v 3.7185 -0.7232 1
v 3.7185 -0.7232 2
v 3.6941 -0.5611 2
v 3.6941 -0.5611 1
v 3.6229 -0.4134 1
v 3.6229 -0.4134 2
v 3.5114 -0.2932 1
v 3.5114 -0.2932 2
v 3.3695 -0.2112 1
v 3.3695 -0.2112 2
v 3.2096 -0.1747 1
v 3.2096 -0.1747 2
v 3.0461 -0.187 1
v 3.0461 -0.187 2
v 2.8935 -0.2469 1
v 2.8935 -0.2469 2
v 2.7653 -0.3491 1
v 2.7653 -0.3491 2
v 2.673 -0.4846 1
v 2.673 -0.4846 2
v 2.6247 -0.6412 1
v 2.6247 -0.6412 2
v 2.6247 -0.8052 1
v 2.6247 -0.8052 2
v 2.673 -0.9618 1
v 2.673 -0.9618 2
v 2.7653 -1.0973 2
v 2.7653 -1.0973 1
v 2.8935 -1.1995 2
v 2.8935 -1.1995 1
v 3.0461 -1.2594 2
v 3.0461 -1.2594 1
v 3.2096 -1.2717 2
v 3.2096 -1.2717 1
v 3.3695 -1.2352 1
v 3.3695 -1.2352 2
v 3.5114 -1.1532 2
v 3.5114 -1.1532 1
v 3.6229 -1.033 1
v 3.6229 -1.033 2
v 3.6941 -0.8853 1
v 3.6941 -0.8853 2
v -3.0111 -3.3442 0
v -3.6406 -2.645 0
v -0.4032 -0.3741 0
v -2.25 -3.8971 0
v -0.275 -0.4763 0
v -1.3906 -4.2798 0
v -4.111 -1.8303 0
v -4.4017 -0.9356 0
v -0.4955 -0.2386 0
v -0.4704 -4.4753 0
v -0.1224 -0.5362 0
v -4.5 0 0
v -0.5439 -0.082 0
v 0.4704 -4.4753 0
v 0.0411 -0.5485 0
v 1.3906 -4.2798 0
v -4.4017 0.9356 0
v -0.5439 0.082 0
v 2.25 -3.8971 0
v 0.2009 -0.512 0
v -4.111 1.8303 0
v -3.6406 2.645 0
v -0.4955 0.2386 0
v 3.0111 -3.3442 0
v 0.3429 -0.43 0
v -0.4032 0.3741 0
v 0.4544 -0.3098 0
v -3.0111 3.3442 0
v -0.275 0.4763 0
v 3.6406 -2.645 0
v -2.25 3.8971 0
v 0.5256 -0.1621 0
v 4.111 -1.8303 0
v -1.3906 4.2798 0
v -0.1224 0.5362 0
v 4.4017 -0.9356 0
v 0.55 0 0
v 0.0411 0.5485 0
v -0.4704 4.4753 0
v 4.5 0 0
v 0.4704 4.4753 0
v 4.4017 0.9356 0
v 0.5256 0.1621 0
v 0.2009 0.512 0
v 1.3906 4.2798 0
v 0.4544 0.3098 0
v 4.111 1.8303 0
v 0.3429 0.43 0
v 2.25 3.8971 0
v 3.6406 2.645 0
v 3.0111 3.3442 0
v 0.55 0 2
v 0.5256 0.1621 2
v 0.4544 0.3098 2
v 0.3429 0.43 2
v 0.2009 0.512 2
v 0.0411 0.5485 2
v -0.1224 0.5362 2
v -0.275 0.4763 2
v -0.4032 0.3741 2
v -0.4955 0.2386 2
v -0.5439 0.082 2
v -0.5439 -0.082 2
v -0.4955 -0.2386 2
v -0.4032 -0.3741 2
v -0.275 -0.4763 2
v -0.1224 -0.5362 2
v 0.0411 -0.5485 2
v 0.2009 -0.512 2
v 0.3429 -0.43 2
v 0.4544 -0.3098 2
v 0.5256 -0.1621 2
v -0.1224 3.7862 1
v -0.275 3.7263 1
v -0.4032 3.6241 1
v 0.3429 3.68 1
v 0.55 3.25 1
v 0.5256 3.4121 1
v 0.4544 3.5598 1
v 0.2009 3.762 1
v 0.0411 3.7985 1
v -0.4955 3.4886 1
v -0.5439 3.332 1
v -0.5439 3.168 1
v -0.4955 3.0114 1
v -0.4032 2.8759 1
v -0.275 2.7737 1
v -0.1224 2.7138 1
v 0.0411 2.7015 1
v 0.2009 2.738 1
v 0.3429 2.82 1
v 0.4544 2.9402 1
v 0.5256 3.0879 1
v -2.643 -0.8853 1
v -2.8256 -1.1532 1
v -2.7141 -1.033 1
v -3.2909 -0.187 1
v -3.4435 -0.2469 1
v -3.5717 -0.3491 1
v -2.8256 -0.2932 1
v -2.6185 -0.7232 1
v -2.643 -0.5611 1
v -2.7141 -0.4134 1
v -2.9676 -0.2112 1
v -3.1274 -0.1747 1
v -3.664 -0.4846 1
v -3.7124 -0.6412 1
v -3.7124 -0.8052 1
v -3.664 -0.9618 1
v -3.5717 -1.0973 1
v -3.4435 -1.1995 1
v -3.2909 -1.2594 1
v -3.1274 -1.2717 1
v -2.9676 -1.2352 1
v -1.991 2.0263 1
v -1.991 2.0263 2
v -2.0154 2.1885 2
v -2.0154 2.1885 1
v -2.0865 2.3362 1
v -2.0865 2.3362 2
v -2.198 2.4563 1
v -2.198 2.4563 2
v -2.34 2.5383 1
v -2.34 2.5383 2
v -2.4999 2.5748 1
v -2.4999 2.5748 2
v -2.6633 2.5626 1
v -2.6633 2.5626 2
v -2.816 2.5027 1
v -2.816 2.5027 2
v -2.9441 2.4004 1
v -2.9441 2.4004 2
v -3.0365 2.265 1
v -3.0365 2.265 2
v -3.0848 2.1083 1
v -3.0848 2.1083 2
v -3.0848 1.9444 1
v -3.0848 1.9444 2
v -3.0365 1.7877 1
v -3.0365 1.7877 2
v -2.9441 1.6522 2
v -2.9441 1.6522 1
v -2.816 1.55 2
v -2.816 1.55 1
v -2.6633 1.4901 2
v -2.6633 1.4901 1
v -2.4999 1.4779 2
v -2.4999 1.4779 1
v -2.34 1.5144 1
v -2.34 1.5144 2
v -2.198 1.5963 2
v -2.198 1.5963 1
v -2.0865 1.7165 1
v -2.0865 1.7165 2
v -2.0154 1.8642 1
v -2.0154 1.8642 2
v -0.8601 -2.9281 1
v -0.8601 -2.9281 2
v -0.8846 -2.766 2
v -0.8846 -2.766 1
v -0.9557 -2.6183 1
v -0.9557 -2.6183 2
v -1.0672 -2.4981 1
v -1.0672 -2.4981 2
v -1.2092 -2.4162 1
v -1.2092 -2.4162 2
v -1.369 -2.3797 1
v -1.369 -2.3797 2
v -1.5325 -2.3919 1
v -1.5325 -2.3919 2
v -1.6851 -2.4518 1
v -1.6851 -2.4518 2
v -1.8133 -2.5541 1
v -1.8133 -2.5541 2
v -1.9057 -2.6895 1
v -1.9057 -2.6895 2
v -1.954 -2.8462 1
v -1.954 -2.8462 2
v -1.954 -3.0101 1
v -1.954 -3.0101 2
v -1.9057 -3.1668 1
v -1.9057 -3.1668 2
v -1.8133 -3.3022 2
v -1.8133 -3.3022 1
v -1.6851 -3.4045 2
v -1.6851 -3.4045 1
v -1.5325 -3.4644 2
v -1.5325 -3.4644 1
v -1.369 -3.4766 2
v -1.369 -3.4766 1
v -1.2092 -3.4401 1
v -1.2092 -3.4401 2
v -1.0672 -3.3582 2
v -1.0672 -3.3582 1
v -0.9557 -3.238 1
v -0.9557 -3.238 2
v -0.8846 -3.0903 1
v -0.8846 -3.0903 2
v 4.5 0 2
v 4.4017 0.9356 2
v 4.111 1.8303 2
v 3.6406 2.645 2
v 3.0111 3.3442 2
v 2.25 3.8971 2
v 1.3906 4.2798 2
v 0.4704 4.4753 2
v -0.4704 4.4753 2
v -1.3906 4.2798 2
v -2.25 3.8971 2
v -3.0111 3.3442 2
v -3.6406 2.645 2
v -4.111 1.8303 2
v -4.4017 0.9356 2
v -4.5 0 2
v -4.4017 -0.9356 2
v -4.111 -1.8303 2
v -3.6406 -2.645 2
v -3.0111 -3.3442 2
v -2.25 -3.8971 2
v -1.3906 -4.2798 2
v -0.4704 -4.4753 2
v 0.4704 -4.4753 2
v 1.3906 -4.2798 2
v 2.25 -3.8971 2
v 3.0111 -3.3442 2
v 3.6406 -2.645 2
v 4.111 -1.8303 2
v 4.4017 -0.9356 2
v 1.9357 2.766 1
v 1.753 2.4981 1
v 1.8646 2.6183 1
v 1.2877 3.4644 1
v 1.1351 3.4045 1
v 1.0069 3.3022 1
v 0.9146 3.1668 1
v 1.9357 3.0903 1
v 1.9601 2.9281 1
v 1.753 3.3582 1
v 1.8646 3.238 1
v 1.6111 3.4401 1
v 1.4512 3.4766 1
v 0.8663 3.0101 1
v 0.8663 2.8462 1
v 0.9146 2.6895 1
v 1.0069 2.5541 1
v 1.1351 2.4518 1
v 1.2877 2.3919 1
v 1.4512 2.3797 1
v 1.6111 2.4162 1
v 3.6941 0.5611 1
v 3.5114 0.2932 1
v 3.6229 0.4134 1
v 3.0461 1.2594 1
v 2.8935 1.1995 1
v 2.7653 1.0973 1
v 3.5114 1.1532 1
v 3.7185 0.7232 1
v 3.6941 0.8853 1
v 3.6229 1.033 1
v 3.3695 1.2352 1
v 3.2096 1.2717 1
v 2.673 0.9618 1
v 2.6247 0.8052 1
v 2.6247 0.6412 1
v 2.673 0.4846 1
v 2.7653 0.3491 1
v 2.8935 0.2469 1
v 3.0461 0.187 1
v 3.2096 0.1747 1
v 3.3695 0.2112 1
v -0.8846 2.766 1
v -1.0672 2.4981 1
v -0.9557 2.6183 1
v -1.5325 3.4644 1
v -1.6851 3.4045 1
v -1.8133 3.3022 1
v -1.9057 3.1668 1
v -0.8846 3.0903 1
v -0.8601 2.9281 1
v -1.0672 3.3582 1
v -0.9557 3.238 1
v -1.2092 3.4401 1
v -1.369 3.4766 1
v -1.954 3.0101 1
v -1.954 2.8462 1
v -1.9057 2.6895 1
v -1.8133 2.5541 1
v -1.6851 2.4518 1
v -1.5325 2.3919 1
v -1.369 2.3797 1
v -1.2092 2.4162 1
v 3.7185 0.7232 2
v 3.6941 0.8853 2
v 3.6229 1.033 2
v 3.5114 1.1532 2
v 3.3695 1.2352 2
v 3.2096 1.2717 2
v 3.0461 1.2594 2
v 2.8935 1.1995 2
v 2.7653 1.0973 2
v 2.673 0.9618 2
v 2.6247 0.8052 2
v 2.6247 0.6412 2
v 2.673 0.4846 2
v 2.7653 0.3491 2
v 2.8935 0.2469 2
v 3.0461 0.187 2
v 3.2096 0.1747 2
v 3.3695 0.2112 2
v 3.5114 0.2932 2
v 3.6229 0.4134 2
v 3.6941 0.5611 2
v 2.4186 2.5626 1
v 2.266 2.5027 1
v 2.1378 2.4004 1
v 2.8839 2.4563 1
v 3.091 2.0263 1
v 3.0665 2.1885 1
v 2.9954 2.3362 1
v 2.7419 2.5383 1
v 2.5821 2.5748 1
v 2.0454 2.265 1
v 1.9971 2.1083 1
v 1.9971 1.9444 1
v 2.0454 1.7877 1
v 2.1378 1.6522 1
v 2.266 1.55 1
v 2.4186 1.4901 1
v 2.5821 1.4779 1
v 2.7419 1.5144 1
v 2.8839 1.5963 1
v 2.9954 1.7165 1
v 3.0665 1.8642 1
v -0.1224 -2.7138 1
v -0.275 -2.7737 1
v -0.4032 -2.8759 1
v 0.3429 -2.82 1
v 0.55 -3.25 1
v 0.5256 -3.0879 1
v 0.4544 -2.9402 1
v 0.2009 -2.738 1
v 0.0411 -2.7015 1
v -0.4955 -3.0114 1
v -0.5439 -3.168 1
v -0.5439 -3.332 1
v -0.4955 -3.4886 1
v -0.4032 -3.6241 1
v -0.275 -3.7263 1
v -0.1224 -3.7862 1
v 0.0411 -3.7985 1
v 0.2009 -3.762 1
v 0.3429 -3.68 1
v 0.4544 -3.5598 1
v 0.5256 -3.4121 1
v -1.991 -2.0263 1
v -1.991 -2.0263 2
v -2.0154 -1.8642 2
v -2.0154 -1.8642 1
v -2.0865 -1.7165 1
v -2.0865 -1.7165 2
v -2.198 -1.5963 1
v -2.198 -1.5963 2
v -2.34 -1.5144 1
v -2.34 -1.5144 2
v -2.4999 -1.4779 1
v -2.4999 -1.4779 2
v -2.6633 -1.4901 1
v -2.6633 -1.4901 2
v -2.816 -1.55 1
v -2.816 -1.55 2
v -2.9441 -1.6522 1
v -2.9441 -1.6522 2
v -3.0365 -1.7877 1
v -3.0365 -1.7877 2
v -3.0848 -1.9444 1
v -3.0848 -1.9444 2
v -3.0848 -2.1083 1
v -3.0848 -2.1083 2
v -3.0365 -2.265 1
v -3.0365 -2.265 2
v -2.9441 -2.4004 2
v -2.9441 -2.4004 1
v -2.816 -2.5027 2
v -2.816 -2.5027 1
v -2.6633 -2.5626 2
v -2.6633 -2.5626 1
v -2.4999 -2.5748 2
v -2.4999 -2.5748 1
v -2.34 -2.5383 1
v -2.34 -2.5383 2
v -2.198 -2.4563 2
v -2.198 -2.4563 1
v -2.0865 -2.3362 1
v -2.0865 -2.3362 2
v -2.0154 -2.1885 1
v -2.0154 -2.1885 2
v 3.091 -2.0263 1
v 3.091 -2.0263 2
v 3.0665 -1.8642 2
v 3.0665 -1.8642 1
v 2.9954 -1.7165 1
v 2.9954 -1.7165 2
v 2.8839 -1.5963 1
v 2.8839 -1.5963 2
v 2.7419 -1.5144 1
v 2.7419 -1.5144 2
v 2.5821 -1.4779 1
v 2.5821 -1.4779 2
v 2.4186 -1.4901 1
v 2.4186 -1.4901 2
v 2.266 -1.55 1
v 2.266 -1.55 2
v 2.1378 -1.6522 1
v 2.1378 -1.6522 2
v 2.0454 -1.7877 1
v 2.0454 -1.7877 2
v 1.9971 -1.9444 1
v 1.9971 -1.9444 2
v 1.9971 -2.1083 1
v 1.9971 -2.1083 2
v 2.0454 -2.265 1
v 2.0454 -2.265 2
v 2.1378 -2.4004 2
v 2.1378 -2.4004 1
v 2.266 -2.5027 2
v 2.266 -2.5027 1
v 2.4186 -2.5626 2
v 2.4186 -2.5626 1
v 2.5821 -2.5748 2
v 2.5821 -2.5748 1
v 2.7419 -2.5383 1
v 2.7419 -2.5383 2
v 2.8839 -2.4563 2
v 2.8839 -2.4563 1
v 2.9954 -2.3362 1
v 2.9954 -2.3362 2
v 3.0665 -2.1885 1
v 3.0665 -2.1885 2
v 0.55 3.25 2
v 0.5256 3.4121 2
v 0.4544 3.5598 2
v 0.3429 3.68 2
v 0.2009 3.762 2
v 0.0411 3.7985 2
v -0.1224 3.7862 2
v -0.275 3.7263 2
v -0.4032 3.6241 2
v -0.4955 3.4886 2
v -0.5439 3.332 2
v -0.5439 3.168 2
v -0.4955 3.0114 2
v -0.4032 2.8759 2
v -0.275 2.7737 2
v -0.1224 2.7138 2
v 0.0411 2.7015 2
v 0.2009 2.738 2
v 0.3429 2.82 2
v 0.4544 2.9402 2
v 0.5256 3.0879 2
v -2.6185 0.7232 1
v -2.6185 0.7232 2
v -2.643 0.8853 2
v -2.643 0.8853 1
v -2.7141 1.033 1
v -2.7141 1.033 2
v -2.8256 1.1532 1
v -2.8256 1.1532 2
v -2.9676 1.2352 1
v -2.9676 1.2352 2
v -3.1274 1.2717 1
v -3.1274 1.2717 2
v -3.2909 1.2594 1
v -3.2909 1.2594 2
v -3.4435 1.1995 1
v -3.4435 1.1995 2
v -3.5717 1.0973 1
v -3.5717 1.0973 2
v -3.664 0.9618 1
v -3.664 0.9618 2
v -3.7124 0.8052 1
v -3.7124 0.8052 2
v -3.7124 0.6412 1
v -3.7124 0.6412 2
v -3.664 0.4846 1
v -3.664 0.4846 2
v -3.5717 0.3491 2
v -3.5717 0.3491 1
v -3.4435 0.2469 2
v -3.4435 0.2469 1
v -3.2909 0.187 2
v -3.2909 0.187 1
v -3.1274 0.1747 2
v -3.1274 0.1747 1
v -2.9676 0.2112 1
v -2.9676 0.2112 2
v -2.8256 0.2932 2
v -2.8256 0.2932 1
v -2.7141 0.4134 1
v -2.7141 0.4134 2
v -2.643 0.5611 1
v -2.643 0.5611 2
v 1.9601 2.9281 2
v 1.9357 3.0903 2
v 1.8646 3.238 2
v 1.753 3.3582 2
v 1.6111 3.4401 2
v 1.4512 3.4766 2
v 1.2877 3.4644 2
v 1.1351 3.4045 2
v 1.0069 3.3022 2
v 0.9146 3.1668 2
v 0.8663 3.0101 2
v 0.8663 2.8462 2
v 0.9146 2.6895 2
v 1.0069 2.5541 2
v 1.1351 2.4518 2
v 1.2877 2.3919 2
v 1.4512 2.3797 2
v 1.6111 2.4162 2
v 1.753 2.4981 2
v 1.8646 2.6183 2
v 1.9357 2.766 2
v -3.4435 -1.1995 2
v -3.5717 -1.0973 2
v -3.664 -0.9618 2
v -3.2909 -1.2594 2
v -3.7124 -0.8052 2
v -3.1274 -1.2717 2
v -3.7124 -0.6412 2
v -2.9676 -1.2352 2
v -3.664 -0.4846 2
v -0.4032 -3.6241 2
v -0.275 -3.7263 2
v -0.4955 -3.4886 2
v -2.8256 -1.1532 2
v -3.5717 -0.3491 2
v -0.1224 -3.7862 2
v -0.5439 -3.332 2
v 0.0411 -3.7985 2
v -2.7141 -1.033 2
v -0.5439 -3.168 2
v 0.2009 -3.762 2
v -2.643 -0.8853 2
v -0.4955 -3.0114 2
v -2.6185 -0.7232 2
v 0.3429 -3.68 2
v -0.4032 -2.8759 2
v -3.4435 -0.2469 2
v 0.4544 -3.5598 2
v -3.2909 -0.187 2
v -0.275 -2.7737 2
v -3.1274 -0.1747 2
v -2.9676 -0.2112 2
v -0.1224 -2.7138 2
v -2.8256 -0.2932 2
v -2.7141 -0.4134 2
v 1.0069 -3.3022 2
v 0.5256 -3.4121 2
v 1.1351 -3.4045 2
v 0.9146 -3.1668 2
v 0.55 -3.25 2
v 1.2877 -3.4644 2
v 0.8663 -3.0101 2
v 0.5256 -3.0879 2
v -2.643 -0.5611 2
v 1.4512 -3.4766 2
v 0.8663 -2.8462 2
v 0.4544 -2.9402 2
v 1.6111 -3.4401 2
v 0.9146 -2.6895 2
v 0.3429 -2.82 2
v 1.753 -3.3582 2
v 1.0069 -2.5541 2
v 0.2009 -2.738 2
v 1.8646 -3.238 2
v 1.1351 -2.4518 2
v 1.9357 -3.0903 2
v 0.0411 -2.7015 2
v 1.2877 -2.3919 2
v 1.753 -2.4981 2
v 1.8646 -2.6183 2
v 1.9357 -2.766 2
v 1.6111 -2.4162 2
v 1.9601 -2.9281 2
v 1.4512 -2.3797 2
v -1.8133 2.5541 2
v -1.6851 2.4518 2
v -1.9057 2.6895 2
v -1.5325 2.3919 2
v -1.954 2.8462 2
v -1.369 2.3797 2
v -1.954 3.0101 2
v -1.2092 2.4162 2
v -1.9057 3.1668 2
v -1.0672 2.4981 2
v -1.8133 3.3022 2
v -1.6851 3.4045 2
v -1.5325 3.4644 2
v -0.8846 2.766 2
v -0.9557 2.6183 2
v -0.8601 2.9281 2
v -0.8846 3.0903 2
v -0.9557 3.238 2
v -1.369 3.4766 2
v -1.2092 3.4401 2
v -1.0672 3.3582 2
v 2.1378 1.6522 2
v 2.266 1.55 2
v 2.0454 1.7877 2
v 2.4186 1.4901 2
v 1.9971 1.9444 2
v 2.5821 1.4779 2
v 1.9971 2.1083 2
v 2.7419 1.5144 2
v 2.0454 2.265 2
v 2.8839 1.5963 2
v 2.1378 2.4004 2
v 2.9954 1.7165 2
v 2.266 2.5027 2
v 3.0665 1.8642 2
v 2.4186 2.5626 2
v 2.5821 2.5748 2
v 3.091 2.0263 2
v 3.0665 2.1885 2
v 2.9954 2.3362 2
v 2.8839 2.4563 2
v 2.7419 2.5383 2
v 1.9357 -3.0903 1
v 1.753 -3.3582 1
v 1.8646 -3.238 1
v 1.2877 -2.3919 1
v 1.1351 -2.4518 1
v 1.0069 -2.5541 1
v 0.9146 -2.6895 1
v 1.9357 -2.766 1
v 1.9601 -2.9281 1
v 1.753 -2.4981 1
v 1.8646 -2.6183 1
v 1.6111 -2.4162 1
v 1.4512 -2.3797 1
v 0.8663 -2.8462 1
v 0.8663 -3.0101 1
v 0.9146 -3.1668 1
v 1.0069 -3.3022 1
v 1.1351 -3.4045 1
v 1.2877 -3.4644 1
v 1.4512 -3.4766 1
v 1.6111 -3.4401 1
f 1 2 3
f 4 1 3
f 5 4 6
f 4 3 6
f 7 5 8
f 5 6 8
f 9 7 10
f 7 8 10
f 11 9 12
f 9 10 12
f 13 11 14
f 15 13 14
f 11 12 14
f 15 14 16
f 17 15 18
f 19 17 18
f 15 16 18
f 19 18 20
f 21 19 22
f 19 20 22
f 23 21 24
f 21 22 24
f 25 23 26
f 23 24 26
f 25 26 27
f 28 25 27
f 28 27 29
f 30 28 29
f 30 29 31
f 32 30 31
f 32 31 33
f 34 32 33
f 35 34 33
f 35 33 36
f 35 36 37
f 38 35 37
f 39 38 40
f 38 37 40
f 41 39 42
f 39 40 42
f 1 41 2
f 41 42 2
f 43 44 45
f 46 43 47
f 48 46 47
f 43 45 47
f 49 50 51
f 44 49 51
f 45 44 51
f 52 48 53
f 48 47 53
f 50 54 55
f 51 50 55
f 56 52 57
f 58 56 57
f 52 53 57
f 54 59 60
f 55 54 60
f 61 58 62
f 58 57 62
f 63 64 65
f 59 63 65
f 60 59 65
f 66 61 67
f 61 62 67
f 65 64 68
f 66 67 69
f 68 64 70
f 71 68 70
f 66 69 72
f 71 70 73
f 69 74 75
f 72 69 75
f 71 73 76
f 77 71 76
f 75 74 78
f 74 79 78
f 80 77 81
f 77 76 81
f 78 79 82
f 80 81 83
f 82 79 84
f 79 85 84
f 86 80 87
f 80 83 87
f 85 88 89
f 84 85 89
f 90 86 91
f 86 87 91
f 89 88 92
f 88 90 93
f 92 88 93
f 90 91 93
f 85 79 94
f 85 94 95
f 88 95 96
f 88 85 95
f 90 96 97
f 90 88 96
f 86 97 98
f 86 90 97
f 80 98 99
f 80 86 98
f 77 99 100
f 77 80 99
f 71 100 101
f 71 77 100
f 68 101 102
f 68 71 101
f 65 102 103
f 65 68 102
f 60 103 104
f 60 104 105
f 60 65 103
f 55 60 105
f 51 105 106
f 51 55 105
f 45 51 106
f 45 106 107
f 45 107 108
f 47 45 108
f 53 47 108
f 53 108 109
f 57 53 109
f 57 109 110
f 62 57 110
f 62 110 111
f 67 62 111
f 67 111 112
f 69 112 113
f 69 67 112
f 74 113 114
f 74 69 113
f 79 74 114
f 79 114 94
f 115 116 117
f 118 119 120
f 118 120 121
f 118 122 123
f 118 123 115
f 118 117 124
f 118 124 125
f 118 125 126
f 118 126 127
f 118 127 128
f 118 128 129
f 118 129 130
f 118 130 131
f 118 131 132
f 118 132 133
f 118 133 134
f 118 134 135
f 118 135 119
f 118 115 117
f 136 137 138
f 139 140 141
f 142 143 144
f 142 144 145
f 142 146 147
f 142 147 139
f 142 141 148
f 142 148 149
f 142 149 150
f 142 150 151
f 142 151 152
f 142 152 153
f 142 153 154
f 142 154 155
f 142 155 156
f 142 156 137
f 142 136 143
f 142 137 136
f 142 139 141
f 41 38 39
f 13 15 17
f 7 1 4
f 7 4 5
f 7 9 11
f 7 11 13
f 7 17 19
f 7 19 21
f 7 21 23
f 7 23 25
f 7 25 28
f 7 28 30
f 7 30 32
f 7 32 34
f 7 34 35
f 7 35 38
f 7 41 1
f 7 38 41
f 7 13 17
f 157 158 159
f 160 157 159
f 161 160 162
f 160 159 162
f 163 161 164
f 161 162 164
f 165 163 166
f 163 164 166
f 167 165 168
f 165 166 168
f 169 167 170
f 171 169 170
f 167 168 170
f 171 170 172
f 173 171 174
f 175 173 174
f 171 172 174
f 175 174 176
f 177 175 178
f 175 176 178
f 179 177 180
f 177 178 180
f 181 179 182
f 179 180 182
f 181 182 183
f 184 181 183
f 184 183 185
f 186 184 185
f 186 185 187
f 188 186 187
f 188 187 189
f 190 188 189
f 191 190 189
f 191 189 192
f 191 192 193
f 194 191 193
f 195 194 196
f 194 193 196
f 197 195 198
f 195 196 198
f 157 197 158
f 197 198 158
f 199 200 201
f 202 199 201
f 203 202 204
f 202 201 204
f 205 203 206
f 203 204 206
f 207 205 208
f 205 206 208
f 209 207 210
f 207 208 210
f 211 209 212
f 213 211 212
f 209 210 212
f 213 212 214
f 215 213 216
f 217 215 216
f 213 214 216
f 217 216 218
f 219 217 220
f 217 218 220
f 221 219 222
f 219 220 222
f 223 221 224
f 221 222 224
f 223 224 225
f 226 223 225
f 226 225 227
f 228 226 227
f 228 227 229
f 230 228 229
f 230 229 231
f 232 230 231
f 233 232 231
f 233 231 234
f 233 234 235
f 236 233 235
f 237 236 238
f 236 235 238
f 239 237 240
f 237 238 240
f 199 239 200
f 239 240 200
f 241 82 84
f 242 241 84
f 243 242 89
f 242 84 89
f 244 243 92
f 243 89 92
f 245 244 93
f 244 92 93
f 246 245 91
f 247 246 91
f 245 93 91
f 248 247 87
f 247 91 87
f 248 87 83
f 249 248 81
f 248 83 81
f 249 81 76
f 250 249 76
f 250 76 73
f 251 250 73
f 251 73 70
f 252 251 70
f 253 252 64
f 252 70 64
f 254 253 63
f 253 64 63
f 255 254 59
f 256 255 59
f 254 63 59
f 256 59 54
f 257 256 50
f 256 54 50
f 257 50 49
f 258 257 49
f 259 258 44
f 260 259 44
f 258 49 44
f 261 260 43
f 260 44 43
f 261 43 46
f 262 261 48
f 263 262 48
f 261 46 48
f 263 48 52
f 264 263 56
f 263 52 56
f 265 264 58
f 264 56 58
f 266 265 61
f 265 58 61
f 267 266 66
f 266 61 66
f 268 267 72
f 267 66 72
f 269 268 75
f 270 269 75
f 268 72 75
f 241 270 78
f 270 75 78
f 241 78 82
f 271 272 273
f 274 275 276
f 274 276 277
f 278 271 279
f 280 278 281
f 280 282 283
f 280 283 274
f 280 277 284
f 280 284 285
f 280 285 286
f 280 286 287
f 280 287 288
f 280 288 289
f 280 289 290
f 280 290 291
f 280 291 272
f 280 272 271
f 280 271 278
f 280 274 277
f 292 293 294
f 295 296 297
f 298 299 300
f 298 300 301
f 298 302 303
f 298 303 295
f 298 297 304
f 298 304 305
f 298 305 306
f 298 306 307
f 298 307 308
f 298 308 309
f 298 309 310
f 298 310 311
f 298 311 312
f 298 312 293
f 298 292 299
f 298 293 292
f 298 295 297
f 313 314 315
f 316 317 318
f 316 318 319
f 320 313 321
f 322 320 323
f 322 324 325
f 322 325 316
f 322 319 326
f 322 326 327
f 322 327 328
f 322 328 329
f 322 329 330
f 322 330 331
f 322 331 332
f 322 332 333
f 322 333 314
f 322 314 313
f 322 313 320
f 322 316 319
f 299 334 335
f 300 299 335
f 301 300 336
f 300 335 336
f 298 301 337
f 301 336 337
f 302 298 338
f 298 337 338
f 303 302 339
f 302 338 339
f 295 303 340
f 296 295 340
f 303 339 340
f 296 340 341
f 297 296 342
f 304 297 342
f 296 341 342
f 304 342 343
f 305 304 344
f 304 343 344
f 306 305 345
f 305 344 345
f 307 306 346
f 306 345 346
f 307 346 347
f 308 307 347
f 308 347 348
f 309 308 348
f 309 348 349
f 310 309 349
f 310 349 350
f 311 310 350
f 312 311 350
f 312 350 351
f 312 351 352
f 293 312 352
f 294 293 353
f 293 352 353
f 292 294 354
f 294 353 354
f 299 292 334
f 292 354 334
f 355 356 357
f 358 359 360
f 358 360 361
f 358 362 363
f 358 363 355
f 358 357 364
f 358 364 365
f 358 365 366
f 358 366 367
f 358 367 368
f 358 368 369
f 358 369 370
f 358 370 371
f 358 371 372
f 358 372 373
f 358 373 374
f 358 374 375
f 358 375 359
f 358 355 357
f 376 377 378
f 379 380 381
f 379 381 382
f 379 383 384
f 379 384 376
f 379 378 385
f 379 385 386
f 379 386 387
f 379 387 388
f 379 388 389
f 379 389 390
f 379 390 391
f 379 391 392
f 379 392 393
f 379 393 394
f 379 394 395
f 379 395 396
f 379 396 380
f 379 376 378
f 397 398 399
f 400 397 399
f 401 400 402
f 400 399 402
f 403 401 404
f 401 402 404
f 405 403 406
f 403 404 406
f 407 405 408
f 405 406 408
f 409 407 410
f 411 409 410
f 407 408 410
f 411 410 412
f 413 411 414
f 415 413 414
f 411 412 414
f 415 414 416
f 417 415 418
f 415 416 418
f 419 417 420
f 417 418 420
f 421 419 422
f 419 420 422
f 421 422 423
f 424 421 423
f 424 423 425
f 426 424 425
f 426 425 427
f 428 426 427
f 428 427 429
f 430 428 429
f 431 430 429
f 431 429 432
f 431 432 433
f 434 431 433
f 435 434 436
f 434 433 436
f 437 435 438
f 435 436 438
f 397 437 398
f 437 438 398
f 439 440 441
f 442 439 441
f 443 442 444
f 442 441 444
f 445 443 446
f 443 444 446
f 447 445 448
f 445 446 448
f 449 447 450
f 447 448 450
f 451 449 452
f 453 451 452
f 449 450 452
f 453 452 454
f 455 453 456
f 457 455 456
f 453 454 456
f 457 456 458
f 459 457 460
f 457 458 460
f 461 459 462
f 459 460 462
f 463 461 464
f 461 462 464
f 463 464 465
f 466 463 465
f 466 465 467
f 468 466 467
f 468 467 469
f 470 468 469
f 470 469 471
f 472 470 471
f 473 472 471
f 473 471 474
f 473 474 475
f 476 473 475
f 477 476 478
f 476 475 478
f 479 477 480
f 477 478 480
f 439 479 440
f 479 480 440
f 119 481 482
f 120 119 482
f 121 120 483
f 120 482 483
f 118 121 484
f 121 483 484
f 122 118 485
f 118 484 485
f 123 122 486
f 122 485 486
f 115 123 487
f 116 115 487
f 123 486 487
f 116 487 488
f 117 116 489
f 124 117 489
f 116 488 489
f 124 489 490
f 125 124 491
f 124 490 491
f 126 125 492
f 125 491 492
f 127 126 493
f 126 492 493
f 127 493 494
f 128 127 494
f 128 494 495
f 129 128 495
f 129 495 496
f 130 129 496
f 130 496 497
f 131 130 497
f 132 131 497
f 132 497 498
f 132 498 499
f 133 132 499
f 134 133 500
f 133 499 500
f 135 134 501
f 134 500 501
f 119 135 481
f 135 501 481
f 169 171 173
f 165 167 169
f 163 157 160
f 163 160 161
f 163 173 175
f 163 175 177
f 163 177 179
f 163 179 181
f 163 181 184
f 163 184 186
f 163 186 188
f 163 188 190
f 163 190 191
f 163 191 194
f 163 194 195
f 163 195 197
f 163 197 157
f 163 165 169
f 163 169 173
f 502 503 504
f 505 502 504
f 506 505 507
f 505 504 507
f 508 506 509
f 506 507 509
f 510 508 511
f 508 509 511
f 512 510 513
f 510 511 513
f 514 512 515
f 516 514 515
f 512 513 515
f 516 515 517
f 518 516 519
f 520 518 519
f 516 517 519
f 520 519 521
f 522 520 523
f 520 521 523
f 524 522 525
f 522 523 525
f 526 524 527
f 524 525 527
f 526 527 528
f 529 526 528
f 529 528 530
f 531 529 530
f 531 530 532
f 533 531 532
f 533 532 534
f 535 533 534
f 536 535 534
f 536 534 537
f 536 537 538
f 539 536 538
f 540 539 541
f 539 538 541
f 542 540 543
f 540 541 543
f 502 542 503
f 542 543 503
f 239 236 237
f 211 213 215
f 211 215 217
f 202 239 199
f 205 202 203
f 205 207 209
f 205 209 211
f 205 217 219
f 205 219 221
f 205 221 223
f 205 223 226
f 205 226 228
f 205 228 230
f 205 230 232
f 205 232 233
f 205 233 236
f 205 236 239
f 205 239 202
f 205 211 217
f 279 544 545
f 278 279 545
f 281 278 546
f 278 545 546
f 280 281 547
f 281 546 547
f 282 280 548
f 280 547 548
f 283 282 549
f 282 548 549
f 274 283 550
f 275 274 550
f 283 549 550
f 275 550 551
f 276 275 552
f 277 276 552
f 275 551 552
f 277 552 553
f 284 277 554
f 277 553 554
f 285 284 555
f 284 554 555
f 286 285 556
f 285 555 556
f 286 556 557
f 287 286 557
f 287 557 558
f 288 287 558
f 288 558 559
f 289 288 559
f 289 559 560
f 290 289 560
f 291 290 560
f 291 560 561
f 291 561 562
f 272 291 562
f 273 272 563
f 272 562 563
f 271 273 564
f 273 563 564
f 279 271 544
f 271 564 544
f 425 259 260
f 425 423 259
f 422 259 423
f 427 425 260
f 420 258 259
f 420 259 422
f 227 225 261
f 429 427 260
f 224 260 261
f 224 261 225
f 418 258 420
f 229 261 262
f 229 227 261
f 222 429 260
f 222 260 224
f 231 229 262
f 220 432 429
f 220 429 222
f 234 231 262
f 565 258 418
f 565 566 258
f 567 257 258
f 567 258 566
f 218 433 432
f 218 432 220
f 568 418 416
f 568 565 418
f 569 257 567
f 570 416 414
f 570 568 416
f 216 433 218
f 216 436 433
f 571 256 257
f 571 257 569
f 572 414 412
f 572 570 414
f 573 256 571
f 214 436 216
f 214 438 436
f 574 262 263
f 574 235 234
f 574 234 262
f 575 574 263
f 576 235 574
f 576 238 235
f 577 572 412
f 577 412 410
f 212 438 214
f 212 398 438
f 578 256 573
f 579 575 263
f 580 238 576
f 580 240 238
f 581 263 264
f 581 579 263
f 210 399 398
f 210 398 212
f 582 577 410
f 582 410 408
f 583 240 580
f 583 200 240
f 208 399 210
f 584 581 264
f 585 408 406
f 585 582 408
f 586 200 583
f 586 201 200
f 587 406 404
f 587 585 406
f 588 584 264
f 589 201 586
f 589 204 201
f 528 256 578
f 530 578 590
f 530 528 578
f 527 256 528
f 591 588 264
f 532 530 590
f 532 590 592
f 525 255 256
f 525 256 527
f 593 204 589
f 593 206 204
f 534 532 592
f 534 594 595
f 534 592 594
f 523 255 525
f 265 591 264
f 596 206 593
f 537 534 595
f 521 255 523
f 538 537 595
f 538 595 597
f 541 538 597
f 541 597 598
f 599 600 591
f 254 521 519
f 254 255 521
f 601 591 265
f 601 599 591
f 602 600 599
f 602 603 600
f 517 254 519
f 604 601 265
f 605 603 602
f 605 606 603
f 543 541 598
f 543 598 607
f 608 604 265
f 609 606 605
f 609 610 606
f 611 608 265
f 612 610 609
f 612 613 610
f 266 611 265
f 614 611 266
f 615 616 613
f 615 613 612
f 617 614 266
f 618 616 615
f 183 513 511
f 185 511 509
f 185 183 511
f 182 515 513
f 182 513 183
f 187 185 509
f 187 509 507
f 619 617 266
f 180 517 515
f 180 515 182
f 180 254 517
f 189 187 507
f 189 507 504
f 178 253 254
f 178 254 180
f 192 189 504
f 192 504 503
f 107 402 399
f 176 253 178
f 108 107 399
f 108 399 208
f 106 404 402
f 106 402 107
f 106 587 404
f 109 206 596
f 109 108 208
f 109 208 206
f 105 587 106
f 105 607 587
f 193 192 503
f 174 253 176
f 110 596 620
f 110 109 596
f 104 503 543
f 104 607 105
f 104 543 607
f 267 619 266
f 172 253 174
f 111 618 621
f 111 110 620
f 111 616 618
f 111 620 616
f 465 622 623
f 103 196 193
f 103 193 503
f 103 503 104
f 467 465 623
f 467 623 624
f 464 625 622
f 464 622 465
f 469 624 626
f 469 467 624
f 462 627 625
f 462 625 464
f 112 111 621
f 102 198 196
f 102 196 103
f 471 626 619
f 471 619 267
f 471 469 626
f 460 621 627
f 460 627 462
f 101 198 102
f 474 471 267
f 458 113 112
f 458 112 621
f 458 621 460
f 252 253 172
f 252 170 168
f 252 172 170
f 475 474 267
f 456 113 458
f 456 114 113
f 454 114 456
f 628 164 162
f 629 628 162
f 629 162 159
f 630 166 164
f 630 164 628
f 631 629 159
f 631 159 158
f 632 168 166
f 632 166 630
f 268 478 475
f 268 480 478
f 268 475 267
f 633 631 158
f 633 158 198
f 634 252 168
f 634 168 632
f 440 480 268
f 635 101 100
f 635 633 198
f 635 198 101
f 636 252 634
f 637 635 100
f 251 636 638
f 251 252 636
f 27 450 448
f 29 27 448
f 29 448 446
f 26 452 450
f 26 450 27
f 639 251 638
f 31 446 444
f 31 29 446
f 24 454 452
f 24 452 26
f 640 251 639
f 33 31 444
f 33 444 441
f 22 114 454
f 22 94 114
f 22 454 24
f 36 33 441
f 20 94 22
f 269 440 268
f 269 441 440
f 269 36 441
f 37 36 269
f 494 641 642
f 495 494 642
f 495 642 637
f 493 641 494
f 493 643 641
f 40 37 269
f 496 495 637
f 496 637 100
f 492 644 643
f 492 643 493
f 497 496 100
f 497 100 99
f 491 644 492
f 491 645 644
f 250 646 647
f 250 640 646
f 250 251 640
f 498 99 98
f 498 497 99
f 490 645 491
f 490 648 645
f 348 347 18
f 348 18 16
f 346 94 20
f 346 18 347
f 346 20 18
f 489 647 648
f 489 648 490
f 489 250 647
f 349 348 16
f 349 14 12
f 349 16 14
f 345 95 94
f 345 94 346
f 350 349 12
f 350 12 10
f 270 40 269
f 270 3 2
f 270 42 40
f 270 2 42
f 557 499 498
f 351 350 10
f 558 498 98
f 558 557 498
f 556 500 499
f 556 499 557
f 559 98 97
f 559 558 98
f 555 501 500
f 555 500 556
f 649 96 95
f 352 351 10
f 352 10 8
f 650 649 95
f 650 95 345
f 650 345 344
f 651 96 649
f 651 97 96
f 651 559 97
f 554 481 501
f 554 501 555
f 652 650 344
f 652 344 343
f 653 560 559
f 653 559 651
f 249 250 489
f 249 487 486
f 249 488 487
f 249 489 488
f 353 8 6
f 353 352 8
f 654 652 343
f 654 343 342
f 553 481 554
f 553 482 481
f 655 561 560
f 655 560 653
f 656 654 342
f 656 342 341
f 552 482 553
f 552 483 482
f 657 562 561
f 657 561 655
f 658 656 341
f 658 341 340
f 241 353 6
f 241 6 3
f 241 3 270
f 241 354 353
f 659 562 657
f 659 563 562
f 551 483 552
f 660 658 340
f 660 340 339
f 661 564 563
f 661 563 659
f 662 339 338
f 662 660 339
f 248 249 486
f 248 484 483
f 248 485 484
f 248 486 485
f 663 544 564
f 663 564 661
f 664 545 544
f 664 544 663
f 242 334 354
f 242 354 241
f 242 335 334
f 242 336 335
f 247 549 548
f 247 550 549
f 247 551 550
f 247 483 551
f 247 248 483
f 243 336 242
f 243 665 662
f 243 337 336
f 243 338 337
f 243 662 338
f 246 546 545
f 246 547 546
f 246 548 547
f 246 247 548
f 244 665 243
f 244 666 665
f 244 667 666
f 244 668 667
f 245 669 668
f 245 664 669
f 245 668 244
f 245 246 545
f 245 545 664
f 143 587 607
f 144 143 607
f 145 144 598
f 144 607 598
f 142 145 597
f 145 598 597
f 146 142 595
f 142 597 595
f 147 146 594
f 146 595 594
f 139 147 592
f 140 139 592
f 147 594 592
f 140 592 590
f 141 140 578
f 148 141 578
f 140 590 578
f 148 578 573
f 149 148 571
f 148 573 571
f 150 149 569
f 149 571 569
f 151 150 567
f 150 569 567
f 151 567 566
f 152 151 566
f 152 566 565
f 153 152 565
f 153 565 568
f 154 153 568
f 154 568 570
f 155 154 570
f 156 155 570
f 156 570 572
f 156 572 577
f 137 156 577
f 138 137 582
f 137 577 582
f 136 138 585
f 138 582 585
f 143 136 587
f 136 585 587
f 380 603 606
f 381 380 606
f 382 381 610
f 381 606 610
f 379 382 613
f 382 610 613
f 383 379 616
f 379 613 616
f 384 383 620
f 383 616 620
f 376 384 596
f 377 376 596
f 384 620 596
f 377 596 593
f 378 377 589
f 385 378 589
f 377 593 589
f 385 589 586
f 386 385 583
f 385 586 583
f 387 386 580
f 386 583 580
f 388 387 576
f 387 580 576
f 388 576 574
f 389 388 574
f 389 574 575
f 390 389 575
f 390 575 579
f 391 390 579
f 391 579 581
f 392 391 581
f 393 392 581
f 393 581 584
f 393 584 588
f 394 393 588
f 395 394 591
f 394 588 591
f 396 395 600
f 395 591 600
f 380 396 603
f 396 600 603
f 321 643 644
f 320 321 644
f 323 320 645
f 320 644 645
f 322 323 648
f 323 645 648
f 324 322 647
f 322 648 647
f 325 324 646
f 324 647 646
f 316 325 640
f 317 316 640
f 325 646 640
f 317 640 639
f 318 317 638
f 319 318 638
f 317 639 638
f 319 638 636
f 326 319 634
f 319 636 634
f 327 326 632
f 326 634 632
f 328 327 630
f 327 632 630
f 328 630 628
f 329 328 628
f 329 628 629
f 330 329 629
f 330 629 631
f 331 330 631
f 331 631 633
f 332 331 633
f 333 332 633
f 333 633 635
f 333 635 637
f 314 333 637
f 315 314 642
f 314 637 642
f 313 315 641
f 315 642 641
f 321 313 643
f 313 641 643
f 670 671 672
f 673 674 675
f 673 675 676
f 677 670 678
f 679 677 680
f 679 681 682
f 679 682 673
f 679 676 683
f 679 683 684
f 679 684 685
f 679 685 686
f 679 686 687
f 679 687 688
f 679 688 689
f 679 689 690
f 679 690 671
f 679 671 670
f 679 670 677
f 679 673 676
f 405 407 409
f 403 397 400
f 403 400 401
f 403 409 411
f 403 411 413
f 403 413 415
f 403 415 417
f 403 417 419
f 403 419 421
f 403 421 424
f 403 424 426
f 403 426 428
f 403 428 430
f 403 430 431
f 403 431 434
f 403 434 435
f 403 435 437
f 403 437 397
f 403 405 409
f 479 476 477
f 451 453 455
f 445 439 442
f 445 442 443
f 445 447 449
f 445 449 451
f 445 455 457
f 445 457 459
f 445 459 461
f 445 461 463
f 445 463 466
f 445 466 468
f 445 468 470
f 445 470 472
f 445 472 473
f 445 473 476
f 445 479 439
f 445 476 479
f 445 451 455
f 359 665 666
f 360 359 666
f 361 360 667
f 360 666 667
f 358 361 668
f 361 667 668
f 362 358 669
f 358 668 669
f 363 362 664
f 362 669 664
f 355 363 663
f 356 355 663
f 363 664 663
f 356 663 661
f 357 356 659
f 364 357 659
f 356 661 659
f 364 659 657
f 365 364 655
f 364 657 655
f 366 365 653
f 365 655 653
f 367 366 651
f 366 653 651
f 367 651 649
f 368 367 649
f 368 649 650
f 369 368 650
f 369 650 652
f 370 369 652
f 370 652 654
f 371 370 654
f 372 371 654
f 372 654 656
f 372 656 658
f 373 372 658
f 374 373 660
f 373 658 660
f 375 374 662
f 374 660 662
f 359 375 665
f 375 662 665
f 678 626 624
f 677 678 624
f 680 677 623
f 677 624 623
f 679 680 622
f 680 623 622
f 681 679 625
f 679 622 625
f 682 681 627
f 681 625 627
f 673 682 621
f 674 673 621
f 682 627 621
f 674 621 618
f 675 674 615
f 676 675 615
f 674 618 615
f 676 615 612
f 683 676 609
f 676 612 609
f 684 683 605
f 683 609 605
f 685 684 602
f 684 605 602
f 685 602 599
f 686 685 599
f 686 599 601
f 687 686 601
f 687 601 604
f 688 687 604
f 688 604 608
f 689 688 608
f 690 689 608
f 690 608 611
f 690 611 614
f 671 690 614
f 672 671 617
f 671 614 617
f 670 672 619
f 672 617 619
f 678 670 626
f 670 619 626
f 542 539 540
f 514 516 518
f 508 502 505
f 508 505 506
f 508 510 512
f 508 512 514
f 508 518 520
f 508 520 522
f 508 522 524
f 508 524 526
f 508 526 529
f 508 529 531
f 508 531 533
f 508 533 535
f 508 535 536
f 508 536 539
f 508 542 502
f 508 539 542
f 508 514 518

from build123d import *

# Parameters (mm, degrees)
SZKIC1_R                    = 4.5
SZKIC1_R_2                  = 0.55
DODANIE_WYCI_GNI_CIE1_DEPTH = 2
SZKIC2_R                    = 0.55
WYTNIJ_WYCI_GNI_CIE1_DEPTH  = 1


with BuildPart() as part:
    # Szkic1 → Dodanie-wyciągnięcie1 (new body)
    with BuildSketch(Plane.XY):
        Circle(SZKIC1_R)
        Circle(SZKIC1_R_2, mode=Mode.SUBTRACT)
    extrude(amount=DODANIE_WYCI_GNI_CIE1_DEPTH)

    # Szkic2 → Wytnij-wyciągnięcie1 (cut)
    with BuildSketch(Plane.XY.offset(2)):
        with Locations((0, 3.25)):
            Circle(SZKIC2_R)
        with Locations((1.410122152, 2.928148821)):
            Circle(SZKIC2_R)
        with Locations((2.540952318, 2.026341856)):
            Circle(SZKIC2_R)
        with Locations((3.168515715, 0.723193035)):
            Circle(SZKIC2_R)
        with Locations((3.168515715, -0.723193035)):
            Circle(SZKIC2_R)
        with Locations((2.540952318, -2.026341856)):
            Circle(SZKIC2_R)
        with Locations((1.410122152, -2.928148821)):
            Circle(SZKIC2_R)
        with Locations((0, -3.25)):
            Circle(SZKIC2_R)
        with Locations((-1.410122152, -2.928148821)):
            Circle(SZKIC2_R)
        with Locations((-2.540952318, -2.026341856)):
            Circle(SZKIC2_R)
        with Locations((-3.168515715, -0.723193035)):
            Circle(SZKIC2_R)
        with Locations((-3.168515715, 0.723193035)):
            Circle(SZKIC2_R)
        with Locations((-2.540952318, 2.026341856)):
            Circle(SZKIC2_R)
        with Locations((-1.410122152, 2.928148821)):
            Circle(SZKIC2_R)
    extrude(amount=-WYTNIJ_WYCI_GNI_CIE1_DEPTH, mode=Mode.SUBTRACT)


solid = part.part
